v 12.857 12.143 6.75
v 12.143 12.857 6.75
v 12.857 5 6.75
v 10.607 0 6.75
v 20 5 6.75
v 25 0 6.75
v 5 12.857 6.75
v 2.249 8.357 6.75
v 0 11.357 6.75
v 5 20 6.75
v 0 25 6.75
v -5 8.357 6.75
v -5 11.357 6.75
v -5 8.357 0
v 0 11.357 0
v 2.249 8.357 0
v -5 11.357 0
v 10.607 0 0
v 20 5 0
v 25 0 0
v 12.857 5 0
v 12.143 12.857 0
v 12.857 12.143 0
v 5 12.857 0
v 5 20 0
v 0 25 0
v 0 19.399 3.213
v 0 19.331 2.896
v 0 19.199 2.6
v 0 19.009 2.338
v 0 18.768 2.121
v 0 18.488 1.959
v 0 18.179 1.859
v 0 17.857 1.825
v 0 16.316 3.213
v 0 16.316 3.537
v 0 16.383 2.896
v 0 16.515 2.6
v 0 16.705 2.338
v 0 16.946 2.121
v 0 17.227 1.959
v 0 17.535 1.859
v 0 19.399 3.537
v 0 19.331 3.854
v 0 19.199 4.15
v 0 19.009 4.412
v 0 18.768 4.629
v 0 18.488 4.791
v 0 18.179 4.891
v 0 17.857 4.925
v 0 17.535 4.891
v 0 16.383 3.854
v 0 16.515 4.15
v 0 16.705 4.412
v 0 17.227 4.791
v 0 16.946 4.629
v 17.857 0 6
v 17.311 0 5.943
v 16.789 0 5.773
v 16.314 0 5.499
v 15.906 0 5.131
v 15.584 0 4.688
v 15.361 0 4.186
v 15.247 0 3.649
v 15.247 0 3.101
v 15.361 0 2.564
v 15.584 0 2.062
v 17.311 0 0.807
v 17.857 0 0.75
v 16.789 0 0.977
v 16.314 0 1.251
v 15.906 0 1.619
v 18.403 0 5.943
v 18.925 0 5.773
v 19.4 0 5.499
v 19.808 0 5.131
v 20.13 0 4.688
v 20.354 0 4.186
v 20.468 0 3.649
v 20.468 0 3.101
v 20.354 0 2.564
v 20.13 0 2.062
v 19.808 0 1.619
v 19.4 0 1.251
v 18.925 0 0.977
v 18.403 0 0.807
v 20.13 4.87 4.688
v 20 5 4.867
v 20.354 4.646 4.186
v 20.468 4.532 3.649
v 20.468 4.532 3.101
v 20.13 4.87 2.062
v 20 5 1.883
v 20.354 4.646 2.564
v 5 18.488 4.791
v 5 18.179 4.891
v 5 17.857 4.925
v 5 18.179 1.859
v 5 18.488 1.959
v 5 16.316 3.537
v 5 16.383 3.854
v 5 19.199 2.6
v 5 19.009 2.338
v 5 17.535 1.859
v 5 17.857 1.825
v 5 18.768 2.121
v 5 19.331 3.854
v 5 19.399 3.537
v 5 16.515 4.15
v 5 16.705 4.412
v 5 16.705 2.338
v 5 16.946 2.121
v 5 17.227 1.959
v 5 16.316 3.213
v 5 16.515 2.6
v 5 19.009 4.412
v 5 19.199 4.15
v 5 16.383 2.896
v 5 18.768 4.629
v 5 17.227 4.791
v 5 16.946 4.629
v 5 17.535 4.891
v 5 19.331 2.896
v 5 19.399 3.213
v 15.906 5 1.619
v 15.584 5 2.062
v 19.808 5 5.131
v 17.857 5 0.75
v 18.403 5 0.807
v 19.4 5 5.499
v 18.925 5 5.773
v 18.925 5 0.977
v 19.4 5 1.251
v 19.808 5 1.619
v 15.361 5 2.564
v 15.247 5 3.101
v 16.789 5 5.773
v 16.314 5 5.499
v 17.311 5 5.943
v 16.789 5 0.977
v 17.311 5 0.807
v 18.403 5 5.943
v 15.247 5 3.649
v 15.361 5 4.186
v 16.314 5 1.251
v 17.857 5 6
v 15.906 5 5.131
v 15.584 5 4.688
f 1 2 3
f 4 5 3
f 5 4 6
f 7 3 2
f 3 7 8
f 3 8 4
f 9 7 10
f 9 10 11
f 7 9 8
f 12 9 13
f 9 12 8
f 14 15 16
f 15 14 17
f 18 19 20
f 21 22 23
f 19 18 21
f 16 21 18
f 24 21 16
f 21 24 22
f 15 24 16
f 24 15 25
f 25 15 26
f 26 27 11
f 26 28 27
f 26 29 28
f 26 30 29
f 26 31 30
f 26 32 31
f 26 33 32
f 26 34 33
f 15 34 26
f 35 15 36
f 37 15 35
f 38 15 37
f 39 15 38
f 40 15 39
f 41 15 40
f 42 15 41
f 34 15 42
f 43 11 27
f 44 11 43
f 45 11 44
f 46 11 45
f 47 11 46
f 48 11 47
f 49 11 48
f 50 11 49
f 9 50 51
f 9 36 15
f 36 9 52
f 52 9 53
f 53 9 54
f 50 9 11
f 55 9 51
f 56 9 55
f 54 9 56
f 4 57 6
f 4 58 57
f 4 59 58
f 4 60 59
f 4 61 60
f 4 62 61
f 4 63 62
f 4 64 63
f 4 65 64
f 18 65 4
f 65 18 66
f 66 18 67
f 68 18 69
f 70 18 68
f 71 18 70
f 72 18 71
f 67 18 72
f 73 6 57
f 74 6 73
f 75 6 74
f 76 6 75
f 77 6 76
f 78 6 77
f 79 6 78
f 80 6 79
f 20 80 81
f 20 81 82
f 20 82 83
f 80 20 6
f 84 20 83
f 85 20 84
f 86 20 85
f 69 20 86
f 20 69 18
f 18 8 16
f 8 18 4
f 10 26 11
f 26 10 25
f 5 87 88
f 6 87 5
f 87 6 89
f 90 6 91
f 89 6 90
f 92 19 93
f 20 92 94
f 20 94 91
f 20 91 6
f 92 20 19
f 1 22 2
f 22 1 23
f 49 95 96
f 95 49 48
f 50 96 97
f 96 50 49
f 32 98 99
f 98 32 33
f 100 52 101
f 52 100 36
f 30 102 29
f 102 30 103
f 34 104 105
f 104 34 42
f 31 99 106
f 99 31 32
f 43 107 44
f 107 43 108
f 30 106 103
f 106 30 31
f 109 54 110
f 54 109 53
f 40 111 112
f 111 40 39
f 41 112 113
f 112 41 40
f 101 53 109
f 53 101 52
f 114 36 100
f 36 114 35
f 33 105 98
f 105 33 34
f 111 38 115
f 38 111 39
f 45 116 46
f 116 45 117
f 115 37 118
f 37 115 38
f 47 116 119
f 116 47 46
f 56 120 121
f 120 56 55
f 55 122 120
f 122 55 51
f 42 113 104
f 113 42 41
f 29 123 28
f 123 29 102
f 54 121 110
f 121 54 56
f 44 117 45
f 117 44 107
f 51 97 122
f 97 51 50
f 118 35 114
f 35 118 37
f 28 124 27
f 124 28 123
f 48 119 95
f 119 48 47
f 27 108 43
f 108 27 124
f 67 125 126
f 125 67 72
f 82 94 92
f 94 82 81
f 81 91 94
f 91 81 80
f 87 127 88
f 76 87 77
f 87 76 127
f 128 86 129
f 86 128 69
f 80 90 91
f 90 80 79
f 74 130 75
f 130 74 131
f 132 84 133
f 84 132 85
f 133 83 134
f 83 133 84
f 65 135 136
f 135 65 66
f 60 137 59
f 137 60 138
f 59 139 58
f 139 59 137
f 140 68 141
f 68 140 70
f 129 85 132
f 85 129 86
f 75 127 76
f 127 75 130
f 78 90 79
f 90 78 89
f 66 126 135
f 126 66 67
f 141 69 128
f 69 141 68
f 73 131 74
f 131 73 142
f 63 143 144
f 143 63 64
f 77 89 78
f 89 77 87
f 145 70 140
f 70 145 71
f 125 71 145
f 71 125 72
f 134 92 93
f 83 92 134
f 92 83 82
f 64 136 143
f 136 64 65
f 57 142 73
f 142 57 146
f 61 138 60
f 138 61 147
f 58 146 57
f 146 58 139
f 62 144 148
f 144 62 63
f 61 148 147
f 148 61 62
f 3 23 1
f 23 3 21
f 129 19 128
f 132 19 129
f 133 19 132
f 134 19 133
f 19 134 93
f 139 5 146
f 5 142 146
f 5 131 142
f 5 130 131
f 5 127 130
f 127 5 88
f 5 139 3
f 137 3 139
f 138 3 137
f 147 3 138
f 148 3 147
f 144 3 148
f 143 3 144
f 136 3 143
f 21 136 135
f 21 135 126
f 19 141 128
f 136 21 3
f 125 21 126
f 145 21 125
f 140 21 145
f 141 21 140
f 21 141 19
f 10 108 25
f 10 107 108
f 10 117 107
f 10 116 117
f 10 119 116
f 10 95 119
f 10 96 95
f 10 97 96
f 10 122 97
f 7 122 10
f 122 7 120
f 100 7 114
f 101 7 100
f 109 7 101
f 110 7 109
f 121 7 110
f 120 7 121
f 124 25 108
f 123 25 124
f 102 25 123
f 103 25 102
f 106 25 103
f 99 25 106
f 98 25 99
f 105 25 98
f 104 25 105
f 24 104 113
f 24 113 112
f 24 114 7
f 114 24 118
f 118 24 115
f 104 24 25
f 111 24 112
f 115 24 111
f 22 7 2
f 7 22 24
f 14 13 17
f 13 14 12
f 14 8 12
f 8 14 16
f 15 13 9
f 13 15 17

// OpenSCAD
// Diameter of screw hole for the screw connecting to R1 build plate carriage.
// 3.1 works for me for a 2.7mm diameter machine screw.
screw_diameter = 3.1;

// Diameter of bolt hole for the bolt that connects to bottom of camera.
// 5.25 works for my 4.85mm diameter bolt.
bolt_diameter = 5.25;

// Width to be added in excess to the widest of `screw_diameter` and
// `bolt_diameter`;
extra_width = 1.5;

// Length on sides as a cube, before all the angles are cut.
// 25mm places the face with the bolt hole almost exactly level with the build
// plate. Lengths smaller than 25 will probably not work right.
length = 25;

// Width and length of the stabilizer wing to keep the mount from rotating.
stabilizer_length = 5;
stabilizer_width = 3;
stabilizer_inset = stabilizer_width;

total_stabilizer_length = stabilizer_length + stabilizer_inset;

// Automatically calculate width to be `extra_width` wider than widest hole.
width = bolt_diameter + extra_width;
if (width < screw_diameter) {
  width = screw_diameter + extra_width;
}



union() {
  difference() {

    // Base cube
    cube([length, length, width]);

    // Diagonal cut toward build plate
    rotate([0,0,45])
      translate([-(length*1.7),-length,0])
        cube([length*2, length*2, width]);

    // Diagonal cut opposite build plate
    translate([length,0,0])
      rotate([0,0,45])
        cube([length*2, length*2, width]);

    // Screw Hole
    translate([0,length/1.4,width/2])
      rotate([0,90,0])
        cylinder(d=screw_diameter, h=40, center=true, $fn=30);

    // Bolt hole
    translate([length/1.4,0,width/2])
      rotate([90,90,0])
        cylinder(d=bolt_diameter, h=40, center=true, $fn=30);

    // Notch behind bolt hole
    translate([length/1.4,length/2.5,width/2])
      cube([length/2.5,length/2.5,width], center=true);

    // Notch behind screw hole
    translate([length/2.5,length/1.4,width/2])
      cube([length/2.5,length/2.5,width], center=true);
  }

  // Stabilizer
  screw_to_top_offset = 6.5; // distance between screw and top of y carriage.
  translate([
    -(total_stabilizer_length-stabilizer_inset),
    (length/1.4)-(screw_to_top_offset+stabilizer_width),
    width
  ])
    rotate([0,90,0])
      cube([width,stabilizer_width,total_stabilizer_length]);
}
